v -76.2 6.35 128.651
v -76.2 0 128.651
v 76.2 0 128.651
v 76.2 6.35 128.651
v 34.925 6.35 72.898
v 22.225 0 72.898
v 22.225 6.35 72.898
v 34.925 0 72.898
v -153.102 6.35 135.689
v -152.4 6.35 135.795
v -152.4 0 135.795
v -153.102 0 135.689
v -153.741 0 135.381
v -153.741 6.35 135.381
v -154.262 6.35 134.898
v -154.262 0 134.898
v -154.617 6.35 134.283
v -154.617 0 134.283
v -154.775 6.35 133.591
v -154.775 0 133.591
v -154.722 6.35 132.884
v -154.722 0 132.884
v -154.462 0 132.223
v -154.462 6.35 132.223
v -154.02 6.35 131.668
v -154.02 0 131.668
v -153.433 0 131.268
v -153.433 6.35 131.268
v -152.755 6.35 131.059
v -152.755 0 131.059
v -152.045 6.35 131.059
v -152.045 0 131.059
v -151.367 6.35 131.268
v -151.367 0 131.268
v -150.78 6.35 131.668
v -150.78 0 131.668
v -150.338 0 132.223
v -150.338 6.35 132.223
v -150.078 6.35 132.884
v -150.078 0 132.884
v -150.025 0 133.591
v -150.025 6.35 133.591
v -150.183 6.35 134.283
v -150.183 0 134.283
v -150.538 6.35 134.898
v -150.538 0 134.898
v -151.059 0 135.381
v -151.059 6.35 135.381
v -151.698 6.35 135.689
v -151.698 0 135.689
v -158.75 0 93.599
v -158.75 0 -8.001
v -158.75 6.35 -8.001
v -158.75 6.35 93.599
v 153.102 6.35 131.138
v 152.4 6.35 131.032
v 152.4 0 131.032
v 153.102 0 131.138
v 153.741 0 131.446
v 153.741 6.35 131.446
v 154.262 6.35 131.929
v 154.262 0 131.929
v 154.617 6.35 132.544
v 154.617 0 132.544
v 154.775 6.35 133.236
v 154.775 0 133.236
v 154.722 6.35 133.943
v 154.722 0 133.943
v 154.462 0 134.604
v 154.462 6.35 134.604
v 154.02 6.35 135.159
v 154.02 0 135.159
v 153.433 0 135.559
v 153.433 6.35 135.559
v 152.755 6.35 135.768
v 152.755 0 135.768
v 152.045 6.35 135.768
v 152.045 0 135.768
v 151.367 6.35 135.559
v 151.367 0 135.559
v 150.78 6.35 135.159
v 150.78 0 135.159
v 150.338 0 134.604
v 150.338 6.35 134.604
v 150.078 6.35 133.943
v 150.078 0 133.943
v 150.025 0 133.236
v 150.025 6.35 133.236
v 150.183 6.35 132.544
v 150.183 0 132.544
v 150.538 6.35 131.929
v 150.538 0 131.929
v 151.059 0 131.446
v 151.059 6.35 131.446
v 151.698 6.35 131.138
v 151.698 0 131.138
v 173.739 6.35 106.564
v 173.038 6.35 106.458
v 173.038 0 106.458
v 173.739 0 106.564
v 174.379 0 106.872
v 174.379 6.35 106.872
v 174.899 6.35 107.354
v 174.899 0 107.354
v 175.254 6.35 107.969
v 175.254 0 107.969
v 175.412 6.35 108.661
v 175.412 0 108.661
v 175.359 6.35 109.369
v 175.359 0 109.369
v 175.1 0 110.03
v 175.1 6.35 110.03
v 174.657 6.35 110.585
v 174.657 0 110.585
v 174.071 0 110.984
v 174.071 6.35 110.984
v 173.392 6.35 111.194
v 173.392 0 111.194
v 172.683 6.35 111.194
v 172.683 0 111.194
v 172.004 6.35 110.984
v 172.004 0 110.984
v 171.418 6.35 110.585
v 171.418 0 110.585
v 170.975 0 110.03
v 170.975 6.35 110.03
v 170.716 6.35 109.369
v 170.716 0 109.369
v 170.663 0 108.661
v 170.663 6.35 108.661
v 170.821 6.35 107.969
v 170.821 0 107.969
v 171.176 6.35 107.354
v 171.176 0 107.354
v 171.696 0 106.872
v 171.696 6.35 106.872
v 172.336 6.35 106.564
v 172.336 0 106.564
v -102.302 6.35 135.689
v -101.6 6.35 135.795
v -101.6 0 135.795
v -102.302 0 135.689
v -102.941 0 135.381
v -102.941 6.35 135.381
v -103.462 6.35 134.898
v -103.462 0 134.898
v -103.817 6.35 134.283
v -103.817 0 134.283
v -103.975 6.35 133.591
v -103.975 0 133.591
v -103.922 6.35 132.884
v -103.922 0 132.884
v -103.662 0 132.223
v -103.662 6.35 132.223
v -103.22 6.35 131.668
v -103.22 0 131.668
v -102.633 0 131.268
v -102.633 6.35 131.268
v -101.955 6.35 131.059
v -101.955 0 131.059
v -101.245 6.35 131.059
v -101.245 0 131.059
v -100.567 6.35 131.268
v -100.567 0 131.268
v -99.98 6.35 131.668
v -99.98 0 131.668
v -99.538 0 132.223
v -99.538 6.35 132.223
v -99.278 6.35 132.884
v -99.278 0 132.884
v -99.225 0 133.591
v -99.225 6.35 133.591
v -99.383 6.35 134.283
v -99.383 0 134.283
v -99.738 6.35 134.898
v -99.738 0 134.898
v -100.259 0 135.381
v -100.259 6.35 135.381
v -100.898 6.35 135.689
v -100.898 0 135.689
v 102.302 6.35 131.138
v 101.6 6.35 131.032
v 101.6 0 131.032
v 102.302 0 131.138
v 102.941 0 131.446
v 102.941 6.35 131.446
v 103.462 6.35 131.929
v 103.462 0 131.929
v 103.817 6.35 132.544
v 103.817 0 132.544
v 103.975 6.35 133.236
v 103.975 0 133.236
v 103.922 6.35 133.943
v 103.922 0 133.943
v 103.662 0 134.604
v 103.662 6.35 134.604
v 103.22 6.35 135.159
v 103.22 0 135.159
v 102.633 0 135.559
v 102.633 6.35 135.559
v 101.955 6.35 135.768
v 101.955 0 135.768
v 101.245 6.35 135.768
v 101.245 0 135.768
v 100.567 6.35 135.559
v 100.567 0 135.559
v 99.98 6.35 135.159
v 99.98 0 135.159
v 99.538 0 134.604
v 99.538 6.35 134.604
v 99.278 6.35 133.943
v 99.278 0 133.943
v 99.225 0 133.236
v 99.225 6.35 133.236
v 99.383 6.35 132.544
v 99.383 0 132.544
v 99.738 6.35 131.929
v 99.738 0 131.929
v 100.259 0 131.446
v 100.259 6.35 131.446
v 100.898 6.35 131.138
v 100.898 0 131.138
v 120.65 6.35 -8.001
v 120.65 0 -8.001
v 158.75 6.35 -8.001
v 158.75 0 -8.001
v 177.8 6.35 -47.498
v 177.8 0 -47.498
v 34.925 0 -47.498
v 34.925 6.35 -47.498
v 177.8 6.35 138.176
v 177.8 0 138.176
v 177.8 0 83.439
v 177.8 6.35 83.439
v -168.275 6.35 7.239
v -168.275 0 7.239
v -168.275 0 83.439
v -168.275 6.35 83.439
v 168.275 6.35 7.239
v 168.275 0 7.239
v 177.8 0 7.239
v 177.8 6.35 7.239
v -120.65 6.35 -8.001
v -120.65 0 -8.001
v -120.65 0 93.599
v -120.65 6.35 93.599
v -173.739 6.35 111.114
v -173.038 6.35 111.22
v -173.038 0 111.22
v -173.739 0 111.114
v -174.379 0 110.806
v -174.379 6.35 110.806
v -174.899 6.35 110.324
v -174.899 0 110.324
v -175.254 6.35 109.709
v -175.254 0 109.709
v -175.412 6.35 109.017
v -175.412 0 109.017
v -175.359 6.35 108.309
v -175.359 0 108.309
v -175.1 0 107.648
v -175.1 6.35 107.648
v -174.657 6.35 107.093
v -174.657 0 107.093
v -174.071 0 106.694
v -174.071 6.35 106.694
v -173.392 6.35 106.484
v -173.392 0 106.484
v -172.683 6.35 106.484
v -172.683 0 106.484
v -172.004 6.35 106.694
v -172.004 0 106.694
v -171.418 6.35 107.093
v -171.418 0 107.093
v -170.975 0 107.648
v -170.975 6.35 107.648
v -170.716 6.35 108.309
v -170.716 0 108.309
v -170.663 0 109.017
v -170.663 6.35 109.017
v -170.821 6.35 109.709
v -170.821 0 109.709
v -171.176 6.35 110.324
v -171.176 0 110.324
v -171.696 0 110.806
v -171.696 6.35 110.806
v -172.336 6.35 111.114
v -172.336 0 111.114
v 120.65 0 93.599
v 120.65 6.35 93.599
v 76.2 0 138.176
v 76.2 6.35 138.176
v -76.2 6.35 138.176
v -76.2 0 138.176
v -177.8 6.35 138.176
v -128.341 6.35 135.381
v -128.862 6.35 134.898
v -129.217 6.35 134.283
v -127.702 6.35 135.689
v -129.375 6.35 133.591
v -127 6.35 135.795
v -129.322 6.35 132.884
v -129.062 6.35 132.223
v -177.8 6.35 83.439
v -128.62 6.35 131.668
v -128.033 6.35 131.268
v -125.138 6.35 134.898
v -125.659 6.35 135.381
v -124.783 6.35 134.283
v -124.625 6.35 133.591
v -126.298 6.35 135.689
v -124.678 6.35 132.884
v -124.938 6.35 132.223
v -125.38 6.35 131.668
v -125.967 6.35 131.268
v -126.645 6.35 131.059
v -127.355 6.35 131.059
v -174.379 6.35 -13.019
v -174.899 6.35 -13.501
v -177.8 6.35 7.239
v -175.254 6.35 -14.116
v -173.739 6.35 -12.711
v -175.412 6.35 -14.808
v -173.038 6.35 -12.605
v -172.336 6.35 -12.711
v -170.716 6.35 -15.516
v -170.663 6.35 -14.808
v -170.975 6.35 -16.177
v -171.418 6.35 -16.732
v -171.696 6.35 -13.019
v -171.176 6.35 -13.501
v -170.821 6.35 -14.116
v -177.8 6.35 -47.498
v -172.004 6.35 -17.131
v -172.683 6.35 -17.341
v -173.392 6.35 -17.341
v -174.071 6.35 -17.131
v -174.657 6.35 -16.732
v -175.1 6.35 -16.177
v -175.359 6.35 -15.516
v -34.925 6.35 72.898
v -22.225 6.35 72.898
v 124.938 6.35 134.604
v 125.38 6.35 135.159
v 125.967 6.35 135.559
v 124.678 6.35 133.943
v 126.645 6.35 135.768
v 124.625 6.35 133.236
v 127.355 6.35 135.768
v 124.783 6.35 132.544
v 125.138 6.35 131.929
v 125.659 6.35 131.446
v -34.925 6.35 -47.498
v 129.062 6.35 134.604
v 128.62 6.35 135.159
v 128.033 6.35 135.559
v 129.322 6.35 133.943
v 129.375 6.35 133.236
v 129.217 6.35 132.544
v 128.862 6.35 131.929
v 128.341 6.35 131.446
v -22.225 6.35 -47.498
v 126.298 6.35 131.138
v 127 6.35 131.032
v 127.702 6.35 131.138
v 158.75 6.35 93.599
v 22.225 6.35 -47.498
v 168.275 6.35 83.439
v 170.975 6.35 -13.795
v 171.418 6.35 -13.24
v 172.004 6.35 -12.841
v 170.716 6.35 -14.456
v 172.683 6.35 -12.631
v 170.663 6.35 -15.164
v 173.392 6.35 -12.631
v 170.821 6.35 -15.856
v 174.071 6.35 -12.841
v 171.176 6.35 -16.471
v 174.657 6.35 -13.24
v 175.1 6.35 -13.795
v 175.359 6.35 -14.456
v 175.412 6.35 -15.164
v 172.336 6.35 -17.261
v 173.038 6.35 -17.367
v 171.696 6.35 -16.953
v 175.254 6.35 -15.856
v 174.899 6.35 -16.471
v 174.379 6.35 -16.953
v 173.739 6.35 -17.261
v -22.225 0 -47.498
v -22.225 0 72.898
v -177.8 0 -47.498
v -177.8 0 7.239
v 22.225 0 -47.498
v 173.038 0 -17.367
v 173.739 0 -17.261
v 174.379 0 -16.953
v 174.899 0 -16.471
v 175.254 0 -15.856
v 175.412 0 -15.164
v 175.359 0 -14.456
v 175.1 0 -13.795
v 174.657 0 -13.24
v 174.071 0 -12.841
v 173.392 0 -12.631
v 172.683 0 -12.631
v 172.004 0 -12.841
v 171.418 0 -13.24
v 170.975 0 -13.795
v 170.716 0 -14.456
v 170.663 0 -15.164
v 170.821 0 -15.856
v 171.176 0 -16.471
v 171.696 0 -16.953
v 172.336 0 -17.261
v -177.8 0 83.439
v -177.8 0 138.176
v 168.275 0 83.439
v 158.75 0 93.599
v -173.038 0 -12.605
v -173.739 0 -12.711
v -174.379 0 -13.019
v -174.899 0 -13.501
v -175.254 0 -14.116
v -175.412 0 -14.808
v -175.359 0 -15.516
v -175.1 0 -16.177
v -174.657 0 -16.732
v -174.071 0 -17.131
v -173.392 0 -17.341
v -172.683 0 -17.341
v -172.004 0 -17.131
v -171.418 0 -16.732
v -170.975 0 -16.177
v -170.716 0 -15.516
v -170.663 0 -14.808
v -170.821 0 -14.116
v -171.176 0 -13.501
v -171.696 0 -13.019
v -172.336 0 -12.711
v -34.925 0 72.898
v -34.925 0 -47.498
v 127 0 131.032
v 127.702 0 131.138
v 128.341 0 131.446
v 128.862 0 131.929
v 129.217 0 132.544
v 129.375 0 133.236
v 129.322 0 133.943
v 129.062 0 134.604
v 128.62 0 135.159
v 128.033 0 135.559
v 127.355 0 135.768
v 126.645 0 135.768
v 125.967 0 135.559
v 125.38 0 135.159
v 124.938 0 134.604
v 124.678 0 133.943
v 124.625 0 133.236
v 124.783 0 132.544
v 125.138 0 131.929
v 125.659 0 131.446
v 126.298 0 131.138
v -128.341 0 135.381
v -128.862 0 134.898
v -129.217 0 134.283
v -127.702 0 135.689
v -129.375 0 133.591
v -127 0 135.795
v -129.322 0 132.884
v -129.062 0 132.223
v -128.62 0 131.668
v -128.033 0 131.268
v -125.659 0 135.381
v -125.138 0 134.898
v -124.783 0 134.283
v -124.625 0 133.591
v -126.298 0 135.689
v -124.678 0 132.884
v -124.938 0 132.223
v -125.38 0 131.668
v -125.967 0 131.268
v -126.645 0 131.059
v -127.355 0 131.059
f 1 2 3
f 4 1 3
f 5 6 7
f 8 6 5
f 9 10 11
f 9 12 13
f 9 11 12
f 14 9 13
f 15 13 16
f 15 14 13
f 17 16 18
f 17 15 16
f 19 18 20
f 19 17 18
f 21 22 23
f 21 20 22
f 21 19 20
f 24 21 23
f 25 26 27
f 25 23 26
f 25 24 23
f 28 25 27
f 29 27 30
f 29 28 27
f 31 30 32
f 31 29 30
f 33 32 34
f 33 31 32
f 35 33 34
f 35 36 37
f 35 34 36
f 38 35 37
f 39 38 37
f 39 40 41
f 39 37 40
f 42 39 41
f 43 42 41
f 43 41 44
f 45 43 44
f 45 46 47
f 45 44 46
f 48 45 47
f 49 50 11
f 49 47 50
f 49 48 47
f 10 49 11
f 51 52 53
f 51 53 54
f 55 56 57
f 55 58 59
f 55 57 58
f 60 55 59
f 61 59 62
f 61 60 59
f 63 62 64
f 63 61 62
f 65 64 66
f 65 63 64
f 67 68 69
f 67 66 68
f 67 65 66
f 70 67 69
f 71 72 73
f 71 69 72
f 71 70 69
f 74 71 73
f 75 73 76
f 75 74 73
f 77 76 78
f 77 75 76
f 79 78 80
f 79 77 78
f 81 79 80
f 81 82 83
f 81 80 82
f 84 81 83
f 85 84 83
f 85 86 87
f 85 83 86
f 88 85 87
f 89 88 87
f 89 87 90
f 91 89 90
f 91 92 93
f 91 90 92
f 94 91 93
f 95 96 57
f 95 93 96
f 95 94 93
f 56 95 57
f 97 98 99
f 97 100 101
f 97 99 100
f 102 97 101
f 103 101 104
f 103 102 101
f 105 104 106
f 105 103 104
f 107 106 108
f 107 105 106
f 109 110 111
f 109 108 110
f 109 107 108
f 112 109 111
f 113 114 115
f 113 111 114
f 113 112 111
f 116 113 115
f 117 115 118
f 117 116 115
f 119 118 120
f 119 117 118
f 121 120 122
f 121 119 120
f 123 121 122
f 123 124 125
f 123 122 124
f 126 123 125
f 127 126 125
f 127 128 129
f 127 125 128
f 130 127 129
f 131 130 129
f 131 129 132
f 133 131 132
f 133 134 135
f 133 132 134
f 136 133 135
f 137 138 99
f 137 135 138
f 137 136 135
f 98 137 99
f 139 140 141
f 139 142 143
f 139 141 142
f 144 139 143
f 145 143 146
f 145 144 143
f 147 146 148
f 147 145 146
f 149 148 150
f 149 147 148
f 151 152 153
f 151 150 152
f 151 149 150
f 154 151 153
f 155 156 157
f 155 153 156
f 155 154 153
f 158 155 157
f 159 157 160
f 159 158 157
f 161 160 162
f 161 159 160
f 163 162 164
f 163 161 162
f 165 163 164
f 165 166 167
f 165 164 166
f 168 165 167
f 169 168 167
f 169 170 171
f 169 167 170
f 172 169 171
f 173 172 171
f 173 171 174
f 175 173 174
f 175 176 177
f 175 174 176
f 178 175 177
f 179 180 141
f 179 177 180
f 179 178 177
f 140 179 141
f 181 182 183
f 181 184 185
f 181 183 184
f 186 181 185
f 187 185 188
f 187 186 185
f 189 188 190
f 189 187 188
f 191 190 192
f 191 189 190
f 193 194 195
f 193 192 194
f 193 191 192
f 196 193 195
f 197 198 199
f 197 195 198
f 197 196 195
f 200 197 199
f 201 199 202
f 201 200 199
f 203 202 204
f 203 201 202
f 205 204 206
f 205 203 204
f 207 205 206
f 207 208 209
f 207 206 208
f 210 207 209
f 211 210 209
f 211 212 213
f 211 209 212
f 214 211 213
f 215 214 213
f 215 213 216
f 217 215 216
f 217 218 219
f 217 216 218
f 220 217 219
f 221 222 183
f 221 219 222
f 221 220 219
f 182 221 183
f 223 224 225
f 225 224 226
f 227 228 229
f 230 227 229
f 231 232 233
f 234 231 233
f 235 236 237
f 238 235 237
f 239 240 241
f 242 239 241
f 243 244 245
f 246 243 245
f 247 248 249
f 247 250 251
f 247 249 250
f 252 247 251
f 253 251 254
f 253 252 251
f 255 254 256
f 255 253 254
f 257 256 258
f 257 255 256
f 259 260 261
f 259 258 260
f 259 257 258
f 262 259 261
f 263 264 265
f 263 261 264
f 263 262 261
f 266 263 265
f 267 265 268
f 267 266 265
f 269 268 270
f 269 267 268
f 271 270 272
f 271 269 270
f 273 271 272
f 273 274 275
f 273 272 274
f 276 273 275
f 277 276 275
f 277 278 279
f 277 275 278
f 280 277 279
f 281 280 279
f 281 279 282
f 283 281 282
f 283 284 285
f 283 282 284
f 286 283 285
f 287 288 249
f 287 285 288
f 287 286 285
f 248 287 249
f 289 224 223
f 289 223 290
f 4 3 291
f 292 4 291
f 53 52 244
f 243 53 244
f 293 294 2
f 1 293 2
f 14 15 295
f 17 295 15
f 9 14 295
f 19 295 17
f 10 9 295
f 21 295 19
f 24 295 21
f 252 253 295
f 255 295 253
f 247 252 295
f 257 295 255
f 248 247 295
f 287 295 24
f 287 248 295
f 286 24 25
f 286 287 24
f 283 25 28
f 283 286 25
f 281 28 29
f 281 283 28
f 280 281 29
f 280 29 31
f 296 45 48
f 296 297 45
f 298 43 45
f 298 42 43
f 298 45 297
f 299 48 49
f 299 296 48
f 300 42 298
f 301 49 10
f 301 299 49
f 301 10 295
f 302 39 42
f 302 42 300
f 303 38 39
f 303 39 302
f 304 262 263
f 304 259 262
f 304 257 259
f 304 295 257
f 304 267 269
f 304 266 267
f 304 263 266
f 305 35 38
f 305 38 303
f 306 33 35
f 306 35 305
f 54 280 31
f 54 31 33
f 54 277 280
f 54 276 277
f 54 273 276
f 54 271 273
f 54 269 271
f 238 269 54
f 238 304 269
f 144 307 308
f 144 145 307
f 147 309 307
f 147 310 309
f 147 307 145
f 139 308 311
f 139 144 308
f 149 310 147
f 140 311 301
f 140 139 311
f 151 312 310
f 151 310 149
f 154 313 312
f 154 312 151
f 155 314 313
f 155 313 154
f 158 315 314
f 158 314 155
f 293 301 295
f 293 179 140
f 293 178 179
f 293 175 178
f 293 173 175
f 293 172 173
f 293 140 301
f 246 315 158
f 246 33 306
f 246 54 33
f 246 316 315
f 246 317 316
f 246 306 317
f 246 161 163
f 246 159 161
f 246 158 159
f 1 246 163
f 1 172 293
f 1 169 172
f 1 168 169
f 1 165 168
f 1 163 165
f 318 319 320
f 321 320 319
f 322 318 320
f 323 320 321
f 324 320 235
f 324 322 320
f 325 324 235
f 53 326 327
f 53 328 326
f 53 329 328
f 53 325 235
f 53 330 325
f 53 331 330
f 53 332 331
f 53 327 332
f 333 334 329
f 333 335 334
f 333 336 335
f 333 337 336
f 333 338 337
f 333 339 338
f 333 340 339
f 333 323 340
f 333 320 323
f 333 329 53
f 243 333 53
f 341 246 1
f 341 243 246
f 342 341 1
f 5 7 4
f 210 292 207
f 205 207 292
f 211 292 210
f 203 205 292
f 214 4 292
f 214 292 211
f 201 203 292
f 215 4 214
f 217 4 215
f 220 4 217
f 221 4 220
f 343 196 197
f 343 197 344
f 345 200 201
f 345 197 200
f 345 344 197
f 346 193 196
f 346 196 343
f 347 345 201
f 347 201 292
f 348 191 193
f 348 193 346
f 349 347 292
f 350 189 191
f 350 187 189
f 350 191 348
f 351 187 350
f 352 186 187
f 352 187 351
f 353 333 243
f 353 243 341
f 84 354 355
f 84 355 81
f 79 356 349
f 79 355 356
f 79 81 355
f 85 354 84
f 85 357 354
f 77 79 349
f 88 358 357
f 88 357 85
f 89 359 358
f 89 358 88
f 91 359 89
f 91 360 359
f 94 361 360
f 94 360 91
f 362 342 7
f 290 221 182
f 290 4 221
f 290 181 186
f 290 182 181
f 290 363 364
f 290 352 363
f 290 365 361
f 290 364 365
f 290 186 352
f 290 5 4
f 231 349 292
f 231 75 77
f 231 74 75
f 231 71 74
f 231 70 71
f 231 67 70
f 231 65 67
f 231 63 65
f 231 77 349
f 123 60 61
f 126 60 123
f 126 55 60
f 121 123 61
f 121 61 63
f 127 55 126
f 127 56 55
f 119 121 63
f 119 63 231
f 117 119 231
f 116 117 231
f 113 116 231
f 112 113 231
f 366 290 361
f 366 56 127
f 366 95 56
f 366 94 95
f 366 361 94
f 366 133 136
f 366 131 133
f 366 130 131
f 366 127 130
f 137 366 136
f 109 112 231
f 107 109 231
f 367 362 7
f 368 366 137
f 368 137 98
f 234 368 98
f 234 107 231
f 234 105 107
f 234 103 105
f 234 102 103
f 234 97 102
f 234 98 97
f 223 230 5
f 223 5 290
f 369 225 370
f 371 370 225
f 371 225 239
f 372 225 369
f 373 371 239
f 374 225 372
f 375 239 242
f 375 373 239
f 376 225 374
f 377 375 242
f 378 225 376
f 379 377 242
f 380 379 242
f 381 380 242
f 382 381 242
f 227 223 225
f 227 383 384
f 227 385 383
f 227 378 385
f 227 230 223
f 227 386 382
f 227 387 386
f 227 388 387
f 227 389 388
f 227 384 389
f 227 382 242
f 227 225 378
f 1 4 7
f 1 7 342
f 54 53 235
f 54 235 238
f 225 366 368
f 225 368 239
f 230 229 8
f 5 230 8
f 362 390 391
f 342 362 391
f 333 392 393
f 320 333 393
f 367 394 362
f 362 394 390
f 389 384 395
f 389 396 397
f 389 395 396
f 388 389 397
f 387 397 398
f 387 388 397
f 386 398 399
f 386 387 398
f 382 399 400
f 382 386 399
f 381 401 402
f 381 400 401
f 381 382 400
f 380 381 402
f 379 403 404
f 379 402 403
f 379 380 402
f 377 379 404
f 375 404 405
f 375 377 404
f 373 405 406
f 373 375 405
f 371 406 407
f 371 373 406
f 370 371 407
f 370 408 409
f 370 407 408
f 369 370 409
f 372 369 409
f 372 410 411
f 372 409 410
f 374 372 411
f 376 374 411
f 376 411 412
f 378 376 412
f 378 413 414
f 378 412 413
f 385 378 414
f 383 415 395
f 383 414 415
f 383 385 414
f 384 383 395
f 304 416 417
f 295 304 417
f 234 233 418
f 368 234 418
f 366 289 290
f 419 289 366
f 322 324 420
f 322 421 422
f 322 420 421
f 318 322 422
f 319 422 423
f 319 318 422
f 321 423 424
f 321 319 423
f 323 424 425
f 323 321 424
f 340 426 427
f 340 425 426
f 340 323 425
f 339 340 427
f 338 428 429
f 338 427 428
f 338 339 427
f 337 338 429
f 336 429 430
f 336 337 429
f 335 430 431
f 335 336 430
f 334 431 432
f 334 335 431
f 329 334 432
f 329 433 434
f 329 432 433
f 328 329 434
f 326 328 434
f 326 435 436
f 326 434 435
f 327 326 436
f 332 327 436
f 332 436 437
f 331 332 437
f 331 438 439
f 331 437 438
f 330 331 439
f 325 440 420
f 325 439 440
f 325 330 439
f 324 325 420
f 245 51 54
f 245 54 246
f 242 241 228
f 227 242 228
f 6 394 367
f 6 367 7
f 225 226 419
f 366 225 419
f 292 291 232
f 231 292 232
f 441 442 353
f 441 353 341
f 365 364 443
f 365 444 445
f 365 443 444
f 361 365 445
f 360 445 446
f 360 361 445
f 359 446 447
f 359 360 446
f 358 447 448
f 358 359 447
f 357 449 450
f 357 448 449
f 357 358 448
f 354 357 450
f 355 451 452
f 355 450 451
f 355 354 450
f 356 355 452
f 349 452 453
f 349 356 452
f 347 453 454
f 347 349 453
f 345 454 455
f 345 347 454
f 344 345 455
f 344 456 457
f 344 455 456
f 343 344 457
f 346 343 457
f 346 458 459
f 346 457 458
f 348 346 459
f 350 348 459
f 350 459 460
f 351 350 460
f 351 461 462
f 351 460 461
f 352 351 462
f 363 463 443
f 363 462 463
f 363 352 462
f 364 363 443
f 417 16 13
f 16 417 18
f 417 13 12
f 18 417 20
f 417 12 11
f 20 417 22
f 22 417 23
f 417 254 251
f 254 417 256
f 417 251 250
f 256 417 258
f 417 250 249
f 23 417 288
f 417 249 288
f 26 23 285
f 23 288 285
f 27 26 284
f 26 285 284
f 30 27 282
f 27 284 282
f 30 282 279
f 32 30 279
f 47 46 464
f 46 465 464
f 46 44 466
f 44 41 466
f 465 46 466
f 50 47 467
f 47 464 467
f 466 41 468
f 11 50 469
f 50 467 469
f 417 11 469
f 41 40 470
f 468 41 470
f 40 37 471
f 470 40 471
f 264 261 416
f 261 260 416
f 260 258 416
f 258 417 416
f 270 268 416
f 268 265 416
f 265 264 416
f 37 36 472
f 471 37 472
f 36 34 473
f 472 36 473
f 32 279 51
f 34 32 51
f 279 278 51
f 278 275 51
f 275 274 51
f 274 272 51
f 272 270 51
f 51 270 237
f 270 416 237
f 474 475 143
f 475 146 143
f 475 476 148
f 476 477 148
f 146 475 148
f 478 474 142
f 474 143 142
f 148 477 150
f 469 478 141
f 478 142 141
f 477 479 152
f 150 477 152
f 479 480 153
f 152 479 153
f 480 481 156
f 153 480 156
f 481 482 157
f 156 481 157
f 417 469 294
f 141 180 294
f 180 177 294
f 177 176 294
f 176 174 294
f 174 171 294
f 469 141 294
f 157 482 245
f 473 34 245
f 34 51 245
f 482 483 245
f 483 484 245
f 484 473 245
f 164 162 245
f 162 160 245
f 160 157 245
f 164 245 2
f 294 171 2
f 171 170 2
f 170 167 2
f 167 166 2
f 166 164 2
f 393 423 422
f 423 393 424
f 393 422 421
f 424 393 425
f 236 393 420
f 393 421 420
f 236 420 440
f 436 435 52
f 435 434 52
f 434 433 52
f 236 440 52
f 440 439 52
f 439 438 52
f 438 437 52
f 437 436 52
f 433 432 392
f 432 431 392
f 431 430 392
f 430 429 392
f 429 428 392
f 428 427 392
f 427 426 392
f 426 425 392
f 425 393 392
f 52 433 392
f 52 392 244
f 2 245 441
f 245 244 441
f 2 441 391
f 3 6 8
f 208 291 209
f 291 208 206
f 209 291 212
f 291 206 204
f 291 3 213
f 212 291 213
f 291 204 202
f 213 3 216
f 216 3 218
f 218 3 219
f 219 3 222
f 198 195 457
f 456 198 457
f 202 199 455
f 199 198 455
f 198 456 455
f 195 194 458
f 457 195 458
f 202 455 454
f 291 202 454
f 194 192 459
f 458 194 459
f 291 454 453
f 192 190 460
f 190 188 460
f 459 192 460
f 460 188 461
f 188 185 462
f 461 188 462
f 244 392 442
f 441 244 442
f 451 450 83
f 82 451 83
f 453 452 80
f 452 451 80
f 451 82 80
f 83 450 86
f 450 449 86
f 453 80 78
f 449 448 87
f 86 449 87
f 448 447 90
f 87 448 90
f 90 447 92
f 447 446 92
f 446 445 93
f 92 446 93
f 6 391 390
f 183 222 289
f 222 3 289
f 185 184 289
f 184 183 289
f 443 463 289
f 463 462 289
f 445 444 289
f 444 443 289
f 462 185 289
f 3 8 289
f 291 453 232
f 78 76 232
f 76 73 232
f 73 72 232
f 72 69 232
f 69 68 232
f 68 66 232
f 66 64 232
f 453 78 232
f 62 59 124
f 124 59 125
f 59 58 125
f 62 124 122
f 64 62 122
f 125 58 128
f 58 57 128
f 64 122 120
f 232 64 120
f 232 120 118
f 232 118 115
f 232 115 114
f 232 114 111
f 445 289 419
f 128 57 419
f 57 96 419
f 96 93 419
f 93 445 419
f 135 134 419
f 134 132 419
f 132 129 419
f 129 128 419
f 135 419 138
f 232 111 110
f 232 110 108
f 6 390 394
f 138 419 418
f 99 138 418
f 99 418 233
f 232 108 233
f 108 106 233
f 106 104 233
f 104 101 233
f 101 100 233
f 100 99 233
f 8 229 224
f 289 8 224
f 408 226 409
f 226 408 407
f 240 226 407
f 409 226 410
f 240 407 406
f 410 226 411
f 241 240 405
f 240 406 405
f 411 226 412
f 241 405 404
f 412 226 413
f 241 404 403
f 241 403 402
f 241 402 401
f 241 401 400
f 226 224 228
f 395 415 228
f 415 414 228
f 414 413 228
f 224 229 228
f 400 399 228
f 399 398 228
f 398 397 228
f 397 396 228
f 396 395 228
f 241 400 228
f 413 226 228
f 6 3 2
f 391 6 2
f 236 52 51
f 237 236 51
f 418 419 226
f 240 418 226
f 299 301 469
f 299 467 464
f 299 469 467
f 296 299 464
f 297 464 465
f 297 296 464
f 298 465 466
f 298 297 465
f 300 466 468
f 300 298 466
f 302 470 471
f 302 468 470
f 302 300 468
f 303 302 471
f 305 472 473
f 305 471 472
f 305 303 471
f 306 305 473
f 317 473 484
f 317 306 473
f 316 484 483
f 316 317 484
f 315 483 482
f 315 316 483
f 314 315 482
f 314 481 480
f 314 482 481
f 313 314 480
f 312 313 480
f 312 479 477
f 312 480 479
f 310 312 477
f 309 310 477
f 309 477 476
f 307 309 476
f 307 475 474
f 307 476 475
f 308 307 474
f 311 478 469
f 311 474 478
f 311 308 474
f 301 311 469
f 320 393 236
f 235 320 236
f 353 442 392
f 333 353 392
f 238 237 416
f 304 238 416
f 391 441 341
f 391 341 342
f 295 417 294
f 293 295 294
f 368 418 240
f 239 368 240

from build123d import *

# Parameters (mm, degrees)
BOSS_EXTRUDE1_DEPTH     = 6.35
CUT_EXTRUDE8_DEPTH      = 226.268216746
CUT_EXTRUDE8_DEPTH_BACK = 226.268216746
SKETCH35_R              = 2.38125
SKETCH36_W              = 12.7
SKETCH36_H              = 152.4
CUT_EXTRUDE9_DEPTH      = 226.268216746
SKETCH37_W              = 38.1
SKETCH37_H              = 101.6
CUT_EXTRUDE10_DEPTH     = 226.268216746


with BuildPart() as part:
    # Sketch1 → Boss-Extrude1 (new body)
    with BuildSketch(Plane(origin=(0, 0, 0), x_dir=(1, 0, 0), z_dir=(0, 1, 0))):
        Polygon((-177.8, -138.176), (-76.2, -138.176), (-76.2, -128.651), (76.2, -128.651), (76.2, -138.176), (177.8, -138.176), (177.8, -83.439), (168.275, -83.439), (168.275, -7.239), (177.8, -7.239), (177.8, 47.498), (-177.8, 47.498), (-177.8, -7.239), (-168.275, -7.239), (-168.275, -83.439), (-177.8, -83.439), align=None)
    extrude(amount=BOSS_EXTRUDE1_DEPTH)

    # Sketch35 → Cut-Extrude8 (cut, two sides: drawn at the far end of the back side and taken through both)
    with BuildSketch(Plane(origin=(0, 0, 0), x_dir=(-1, 0, 0), z_dir=(0, -1, 0)).offset(-CUT_EXTRUDE8_DEPTH_BACK)):
        with Locations(Location((-173.0375, 14.986, 0), (0, 0, 90))):
            Circle(SKETCH35_R)
        with Locations(Location((-173.0375, -108.839, 0), (0, 0, 90))):
            Circle(SKETCH35_R)
        with Locations(Location((-101.6, -133.4135, 0), (0, 0, 90))):
            Circle(SKETCH35_R)
        with Locations(Location((-127, -133.4135, 0), (0, 0, 90))):
            Circle(SKETCH35_R)
        with Locations(Location((-152.4, -133.4135, 0), (0, 0, 90))):
            Circle(SKETCH35_R)
        with Locations(Location((101.6, -133.4135, 0), (0, 0, 270))):
            Circle(SKETCH35_R)
        with Locations(Location((127, -133.4135, 0), (0, 0, 270))):
            Circle(SKETCH35_R)
        with Locations(Location((152.4, -133.4135, 0), (0, 0, 270))):
            Circle(SKETCH35_R)
        with Locations(Location((173.0375, -108.839, 0), (0, 0, 270))):
            Circle(SKETCH35_R)
        with Locations(Location((173.0375, 14.986, 0), (0, 0, 270))):
            Circle(SKETCH35_R)
    extrude(amount=CUT_EXTRUDE8_DEPTH + CUT_EXTRUDE8_DEPTH_BACK, mode=Mode.SUBTRACT)

    # Sketch36 → Cut-Extrude9 (cut, through all)
    with BuildSketch(Plane.XZ):
        with Locations((-28.575, -3.302)):
            Rectangle(SKETCH36_W, SKETCH36_H)
        with Locations((28.575, -3.302)):
            Rectangle(SKETCH36_W, SKETCH36_H)
    extrude(amount=-CUT_EXTRUDE9_DEPTH, mode=Mode.SUBTRACT)

    # Sketch37 → Cut-Extrude10 (cut, through all)
    with BuildSketch(Plane.XZ):
        with Locations((-139.7, 42.799)):
            Rectangle(SKETCH37_W, SKETCH37_H)
        with Locations((139.7, 42.799)):
            Rectangle(SKETCH37_W, SKETCH37_H)
    extrude(amount=-CUT_EXTRUDE10_DEPTH, mode=Mode.SUBTRACT)


solid = part.part
